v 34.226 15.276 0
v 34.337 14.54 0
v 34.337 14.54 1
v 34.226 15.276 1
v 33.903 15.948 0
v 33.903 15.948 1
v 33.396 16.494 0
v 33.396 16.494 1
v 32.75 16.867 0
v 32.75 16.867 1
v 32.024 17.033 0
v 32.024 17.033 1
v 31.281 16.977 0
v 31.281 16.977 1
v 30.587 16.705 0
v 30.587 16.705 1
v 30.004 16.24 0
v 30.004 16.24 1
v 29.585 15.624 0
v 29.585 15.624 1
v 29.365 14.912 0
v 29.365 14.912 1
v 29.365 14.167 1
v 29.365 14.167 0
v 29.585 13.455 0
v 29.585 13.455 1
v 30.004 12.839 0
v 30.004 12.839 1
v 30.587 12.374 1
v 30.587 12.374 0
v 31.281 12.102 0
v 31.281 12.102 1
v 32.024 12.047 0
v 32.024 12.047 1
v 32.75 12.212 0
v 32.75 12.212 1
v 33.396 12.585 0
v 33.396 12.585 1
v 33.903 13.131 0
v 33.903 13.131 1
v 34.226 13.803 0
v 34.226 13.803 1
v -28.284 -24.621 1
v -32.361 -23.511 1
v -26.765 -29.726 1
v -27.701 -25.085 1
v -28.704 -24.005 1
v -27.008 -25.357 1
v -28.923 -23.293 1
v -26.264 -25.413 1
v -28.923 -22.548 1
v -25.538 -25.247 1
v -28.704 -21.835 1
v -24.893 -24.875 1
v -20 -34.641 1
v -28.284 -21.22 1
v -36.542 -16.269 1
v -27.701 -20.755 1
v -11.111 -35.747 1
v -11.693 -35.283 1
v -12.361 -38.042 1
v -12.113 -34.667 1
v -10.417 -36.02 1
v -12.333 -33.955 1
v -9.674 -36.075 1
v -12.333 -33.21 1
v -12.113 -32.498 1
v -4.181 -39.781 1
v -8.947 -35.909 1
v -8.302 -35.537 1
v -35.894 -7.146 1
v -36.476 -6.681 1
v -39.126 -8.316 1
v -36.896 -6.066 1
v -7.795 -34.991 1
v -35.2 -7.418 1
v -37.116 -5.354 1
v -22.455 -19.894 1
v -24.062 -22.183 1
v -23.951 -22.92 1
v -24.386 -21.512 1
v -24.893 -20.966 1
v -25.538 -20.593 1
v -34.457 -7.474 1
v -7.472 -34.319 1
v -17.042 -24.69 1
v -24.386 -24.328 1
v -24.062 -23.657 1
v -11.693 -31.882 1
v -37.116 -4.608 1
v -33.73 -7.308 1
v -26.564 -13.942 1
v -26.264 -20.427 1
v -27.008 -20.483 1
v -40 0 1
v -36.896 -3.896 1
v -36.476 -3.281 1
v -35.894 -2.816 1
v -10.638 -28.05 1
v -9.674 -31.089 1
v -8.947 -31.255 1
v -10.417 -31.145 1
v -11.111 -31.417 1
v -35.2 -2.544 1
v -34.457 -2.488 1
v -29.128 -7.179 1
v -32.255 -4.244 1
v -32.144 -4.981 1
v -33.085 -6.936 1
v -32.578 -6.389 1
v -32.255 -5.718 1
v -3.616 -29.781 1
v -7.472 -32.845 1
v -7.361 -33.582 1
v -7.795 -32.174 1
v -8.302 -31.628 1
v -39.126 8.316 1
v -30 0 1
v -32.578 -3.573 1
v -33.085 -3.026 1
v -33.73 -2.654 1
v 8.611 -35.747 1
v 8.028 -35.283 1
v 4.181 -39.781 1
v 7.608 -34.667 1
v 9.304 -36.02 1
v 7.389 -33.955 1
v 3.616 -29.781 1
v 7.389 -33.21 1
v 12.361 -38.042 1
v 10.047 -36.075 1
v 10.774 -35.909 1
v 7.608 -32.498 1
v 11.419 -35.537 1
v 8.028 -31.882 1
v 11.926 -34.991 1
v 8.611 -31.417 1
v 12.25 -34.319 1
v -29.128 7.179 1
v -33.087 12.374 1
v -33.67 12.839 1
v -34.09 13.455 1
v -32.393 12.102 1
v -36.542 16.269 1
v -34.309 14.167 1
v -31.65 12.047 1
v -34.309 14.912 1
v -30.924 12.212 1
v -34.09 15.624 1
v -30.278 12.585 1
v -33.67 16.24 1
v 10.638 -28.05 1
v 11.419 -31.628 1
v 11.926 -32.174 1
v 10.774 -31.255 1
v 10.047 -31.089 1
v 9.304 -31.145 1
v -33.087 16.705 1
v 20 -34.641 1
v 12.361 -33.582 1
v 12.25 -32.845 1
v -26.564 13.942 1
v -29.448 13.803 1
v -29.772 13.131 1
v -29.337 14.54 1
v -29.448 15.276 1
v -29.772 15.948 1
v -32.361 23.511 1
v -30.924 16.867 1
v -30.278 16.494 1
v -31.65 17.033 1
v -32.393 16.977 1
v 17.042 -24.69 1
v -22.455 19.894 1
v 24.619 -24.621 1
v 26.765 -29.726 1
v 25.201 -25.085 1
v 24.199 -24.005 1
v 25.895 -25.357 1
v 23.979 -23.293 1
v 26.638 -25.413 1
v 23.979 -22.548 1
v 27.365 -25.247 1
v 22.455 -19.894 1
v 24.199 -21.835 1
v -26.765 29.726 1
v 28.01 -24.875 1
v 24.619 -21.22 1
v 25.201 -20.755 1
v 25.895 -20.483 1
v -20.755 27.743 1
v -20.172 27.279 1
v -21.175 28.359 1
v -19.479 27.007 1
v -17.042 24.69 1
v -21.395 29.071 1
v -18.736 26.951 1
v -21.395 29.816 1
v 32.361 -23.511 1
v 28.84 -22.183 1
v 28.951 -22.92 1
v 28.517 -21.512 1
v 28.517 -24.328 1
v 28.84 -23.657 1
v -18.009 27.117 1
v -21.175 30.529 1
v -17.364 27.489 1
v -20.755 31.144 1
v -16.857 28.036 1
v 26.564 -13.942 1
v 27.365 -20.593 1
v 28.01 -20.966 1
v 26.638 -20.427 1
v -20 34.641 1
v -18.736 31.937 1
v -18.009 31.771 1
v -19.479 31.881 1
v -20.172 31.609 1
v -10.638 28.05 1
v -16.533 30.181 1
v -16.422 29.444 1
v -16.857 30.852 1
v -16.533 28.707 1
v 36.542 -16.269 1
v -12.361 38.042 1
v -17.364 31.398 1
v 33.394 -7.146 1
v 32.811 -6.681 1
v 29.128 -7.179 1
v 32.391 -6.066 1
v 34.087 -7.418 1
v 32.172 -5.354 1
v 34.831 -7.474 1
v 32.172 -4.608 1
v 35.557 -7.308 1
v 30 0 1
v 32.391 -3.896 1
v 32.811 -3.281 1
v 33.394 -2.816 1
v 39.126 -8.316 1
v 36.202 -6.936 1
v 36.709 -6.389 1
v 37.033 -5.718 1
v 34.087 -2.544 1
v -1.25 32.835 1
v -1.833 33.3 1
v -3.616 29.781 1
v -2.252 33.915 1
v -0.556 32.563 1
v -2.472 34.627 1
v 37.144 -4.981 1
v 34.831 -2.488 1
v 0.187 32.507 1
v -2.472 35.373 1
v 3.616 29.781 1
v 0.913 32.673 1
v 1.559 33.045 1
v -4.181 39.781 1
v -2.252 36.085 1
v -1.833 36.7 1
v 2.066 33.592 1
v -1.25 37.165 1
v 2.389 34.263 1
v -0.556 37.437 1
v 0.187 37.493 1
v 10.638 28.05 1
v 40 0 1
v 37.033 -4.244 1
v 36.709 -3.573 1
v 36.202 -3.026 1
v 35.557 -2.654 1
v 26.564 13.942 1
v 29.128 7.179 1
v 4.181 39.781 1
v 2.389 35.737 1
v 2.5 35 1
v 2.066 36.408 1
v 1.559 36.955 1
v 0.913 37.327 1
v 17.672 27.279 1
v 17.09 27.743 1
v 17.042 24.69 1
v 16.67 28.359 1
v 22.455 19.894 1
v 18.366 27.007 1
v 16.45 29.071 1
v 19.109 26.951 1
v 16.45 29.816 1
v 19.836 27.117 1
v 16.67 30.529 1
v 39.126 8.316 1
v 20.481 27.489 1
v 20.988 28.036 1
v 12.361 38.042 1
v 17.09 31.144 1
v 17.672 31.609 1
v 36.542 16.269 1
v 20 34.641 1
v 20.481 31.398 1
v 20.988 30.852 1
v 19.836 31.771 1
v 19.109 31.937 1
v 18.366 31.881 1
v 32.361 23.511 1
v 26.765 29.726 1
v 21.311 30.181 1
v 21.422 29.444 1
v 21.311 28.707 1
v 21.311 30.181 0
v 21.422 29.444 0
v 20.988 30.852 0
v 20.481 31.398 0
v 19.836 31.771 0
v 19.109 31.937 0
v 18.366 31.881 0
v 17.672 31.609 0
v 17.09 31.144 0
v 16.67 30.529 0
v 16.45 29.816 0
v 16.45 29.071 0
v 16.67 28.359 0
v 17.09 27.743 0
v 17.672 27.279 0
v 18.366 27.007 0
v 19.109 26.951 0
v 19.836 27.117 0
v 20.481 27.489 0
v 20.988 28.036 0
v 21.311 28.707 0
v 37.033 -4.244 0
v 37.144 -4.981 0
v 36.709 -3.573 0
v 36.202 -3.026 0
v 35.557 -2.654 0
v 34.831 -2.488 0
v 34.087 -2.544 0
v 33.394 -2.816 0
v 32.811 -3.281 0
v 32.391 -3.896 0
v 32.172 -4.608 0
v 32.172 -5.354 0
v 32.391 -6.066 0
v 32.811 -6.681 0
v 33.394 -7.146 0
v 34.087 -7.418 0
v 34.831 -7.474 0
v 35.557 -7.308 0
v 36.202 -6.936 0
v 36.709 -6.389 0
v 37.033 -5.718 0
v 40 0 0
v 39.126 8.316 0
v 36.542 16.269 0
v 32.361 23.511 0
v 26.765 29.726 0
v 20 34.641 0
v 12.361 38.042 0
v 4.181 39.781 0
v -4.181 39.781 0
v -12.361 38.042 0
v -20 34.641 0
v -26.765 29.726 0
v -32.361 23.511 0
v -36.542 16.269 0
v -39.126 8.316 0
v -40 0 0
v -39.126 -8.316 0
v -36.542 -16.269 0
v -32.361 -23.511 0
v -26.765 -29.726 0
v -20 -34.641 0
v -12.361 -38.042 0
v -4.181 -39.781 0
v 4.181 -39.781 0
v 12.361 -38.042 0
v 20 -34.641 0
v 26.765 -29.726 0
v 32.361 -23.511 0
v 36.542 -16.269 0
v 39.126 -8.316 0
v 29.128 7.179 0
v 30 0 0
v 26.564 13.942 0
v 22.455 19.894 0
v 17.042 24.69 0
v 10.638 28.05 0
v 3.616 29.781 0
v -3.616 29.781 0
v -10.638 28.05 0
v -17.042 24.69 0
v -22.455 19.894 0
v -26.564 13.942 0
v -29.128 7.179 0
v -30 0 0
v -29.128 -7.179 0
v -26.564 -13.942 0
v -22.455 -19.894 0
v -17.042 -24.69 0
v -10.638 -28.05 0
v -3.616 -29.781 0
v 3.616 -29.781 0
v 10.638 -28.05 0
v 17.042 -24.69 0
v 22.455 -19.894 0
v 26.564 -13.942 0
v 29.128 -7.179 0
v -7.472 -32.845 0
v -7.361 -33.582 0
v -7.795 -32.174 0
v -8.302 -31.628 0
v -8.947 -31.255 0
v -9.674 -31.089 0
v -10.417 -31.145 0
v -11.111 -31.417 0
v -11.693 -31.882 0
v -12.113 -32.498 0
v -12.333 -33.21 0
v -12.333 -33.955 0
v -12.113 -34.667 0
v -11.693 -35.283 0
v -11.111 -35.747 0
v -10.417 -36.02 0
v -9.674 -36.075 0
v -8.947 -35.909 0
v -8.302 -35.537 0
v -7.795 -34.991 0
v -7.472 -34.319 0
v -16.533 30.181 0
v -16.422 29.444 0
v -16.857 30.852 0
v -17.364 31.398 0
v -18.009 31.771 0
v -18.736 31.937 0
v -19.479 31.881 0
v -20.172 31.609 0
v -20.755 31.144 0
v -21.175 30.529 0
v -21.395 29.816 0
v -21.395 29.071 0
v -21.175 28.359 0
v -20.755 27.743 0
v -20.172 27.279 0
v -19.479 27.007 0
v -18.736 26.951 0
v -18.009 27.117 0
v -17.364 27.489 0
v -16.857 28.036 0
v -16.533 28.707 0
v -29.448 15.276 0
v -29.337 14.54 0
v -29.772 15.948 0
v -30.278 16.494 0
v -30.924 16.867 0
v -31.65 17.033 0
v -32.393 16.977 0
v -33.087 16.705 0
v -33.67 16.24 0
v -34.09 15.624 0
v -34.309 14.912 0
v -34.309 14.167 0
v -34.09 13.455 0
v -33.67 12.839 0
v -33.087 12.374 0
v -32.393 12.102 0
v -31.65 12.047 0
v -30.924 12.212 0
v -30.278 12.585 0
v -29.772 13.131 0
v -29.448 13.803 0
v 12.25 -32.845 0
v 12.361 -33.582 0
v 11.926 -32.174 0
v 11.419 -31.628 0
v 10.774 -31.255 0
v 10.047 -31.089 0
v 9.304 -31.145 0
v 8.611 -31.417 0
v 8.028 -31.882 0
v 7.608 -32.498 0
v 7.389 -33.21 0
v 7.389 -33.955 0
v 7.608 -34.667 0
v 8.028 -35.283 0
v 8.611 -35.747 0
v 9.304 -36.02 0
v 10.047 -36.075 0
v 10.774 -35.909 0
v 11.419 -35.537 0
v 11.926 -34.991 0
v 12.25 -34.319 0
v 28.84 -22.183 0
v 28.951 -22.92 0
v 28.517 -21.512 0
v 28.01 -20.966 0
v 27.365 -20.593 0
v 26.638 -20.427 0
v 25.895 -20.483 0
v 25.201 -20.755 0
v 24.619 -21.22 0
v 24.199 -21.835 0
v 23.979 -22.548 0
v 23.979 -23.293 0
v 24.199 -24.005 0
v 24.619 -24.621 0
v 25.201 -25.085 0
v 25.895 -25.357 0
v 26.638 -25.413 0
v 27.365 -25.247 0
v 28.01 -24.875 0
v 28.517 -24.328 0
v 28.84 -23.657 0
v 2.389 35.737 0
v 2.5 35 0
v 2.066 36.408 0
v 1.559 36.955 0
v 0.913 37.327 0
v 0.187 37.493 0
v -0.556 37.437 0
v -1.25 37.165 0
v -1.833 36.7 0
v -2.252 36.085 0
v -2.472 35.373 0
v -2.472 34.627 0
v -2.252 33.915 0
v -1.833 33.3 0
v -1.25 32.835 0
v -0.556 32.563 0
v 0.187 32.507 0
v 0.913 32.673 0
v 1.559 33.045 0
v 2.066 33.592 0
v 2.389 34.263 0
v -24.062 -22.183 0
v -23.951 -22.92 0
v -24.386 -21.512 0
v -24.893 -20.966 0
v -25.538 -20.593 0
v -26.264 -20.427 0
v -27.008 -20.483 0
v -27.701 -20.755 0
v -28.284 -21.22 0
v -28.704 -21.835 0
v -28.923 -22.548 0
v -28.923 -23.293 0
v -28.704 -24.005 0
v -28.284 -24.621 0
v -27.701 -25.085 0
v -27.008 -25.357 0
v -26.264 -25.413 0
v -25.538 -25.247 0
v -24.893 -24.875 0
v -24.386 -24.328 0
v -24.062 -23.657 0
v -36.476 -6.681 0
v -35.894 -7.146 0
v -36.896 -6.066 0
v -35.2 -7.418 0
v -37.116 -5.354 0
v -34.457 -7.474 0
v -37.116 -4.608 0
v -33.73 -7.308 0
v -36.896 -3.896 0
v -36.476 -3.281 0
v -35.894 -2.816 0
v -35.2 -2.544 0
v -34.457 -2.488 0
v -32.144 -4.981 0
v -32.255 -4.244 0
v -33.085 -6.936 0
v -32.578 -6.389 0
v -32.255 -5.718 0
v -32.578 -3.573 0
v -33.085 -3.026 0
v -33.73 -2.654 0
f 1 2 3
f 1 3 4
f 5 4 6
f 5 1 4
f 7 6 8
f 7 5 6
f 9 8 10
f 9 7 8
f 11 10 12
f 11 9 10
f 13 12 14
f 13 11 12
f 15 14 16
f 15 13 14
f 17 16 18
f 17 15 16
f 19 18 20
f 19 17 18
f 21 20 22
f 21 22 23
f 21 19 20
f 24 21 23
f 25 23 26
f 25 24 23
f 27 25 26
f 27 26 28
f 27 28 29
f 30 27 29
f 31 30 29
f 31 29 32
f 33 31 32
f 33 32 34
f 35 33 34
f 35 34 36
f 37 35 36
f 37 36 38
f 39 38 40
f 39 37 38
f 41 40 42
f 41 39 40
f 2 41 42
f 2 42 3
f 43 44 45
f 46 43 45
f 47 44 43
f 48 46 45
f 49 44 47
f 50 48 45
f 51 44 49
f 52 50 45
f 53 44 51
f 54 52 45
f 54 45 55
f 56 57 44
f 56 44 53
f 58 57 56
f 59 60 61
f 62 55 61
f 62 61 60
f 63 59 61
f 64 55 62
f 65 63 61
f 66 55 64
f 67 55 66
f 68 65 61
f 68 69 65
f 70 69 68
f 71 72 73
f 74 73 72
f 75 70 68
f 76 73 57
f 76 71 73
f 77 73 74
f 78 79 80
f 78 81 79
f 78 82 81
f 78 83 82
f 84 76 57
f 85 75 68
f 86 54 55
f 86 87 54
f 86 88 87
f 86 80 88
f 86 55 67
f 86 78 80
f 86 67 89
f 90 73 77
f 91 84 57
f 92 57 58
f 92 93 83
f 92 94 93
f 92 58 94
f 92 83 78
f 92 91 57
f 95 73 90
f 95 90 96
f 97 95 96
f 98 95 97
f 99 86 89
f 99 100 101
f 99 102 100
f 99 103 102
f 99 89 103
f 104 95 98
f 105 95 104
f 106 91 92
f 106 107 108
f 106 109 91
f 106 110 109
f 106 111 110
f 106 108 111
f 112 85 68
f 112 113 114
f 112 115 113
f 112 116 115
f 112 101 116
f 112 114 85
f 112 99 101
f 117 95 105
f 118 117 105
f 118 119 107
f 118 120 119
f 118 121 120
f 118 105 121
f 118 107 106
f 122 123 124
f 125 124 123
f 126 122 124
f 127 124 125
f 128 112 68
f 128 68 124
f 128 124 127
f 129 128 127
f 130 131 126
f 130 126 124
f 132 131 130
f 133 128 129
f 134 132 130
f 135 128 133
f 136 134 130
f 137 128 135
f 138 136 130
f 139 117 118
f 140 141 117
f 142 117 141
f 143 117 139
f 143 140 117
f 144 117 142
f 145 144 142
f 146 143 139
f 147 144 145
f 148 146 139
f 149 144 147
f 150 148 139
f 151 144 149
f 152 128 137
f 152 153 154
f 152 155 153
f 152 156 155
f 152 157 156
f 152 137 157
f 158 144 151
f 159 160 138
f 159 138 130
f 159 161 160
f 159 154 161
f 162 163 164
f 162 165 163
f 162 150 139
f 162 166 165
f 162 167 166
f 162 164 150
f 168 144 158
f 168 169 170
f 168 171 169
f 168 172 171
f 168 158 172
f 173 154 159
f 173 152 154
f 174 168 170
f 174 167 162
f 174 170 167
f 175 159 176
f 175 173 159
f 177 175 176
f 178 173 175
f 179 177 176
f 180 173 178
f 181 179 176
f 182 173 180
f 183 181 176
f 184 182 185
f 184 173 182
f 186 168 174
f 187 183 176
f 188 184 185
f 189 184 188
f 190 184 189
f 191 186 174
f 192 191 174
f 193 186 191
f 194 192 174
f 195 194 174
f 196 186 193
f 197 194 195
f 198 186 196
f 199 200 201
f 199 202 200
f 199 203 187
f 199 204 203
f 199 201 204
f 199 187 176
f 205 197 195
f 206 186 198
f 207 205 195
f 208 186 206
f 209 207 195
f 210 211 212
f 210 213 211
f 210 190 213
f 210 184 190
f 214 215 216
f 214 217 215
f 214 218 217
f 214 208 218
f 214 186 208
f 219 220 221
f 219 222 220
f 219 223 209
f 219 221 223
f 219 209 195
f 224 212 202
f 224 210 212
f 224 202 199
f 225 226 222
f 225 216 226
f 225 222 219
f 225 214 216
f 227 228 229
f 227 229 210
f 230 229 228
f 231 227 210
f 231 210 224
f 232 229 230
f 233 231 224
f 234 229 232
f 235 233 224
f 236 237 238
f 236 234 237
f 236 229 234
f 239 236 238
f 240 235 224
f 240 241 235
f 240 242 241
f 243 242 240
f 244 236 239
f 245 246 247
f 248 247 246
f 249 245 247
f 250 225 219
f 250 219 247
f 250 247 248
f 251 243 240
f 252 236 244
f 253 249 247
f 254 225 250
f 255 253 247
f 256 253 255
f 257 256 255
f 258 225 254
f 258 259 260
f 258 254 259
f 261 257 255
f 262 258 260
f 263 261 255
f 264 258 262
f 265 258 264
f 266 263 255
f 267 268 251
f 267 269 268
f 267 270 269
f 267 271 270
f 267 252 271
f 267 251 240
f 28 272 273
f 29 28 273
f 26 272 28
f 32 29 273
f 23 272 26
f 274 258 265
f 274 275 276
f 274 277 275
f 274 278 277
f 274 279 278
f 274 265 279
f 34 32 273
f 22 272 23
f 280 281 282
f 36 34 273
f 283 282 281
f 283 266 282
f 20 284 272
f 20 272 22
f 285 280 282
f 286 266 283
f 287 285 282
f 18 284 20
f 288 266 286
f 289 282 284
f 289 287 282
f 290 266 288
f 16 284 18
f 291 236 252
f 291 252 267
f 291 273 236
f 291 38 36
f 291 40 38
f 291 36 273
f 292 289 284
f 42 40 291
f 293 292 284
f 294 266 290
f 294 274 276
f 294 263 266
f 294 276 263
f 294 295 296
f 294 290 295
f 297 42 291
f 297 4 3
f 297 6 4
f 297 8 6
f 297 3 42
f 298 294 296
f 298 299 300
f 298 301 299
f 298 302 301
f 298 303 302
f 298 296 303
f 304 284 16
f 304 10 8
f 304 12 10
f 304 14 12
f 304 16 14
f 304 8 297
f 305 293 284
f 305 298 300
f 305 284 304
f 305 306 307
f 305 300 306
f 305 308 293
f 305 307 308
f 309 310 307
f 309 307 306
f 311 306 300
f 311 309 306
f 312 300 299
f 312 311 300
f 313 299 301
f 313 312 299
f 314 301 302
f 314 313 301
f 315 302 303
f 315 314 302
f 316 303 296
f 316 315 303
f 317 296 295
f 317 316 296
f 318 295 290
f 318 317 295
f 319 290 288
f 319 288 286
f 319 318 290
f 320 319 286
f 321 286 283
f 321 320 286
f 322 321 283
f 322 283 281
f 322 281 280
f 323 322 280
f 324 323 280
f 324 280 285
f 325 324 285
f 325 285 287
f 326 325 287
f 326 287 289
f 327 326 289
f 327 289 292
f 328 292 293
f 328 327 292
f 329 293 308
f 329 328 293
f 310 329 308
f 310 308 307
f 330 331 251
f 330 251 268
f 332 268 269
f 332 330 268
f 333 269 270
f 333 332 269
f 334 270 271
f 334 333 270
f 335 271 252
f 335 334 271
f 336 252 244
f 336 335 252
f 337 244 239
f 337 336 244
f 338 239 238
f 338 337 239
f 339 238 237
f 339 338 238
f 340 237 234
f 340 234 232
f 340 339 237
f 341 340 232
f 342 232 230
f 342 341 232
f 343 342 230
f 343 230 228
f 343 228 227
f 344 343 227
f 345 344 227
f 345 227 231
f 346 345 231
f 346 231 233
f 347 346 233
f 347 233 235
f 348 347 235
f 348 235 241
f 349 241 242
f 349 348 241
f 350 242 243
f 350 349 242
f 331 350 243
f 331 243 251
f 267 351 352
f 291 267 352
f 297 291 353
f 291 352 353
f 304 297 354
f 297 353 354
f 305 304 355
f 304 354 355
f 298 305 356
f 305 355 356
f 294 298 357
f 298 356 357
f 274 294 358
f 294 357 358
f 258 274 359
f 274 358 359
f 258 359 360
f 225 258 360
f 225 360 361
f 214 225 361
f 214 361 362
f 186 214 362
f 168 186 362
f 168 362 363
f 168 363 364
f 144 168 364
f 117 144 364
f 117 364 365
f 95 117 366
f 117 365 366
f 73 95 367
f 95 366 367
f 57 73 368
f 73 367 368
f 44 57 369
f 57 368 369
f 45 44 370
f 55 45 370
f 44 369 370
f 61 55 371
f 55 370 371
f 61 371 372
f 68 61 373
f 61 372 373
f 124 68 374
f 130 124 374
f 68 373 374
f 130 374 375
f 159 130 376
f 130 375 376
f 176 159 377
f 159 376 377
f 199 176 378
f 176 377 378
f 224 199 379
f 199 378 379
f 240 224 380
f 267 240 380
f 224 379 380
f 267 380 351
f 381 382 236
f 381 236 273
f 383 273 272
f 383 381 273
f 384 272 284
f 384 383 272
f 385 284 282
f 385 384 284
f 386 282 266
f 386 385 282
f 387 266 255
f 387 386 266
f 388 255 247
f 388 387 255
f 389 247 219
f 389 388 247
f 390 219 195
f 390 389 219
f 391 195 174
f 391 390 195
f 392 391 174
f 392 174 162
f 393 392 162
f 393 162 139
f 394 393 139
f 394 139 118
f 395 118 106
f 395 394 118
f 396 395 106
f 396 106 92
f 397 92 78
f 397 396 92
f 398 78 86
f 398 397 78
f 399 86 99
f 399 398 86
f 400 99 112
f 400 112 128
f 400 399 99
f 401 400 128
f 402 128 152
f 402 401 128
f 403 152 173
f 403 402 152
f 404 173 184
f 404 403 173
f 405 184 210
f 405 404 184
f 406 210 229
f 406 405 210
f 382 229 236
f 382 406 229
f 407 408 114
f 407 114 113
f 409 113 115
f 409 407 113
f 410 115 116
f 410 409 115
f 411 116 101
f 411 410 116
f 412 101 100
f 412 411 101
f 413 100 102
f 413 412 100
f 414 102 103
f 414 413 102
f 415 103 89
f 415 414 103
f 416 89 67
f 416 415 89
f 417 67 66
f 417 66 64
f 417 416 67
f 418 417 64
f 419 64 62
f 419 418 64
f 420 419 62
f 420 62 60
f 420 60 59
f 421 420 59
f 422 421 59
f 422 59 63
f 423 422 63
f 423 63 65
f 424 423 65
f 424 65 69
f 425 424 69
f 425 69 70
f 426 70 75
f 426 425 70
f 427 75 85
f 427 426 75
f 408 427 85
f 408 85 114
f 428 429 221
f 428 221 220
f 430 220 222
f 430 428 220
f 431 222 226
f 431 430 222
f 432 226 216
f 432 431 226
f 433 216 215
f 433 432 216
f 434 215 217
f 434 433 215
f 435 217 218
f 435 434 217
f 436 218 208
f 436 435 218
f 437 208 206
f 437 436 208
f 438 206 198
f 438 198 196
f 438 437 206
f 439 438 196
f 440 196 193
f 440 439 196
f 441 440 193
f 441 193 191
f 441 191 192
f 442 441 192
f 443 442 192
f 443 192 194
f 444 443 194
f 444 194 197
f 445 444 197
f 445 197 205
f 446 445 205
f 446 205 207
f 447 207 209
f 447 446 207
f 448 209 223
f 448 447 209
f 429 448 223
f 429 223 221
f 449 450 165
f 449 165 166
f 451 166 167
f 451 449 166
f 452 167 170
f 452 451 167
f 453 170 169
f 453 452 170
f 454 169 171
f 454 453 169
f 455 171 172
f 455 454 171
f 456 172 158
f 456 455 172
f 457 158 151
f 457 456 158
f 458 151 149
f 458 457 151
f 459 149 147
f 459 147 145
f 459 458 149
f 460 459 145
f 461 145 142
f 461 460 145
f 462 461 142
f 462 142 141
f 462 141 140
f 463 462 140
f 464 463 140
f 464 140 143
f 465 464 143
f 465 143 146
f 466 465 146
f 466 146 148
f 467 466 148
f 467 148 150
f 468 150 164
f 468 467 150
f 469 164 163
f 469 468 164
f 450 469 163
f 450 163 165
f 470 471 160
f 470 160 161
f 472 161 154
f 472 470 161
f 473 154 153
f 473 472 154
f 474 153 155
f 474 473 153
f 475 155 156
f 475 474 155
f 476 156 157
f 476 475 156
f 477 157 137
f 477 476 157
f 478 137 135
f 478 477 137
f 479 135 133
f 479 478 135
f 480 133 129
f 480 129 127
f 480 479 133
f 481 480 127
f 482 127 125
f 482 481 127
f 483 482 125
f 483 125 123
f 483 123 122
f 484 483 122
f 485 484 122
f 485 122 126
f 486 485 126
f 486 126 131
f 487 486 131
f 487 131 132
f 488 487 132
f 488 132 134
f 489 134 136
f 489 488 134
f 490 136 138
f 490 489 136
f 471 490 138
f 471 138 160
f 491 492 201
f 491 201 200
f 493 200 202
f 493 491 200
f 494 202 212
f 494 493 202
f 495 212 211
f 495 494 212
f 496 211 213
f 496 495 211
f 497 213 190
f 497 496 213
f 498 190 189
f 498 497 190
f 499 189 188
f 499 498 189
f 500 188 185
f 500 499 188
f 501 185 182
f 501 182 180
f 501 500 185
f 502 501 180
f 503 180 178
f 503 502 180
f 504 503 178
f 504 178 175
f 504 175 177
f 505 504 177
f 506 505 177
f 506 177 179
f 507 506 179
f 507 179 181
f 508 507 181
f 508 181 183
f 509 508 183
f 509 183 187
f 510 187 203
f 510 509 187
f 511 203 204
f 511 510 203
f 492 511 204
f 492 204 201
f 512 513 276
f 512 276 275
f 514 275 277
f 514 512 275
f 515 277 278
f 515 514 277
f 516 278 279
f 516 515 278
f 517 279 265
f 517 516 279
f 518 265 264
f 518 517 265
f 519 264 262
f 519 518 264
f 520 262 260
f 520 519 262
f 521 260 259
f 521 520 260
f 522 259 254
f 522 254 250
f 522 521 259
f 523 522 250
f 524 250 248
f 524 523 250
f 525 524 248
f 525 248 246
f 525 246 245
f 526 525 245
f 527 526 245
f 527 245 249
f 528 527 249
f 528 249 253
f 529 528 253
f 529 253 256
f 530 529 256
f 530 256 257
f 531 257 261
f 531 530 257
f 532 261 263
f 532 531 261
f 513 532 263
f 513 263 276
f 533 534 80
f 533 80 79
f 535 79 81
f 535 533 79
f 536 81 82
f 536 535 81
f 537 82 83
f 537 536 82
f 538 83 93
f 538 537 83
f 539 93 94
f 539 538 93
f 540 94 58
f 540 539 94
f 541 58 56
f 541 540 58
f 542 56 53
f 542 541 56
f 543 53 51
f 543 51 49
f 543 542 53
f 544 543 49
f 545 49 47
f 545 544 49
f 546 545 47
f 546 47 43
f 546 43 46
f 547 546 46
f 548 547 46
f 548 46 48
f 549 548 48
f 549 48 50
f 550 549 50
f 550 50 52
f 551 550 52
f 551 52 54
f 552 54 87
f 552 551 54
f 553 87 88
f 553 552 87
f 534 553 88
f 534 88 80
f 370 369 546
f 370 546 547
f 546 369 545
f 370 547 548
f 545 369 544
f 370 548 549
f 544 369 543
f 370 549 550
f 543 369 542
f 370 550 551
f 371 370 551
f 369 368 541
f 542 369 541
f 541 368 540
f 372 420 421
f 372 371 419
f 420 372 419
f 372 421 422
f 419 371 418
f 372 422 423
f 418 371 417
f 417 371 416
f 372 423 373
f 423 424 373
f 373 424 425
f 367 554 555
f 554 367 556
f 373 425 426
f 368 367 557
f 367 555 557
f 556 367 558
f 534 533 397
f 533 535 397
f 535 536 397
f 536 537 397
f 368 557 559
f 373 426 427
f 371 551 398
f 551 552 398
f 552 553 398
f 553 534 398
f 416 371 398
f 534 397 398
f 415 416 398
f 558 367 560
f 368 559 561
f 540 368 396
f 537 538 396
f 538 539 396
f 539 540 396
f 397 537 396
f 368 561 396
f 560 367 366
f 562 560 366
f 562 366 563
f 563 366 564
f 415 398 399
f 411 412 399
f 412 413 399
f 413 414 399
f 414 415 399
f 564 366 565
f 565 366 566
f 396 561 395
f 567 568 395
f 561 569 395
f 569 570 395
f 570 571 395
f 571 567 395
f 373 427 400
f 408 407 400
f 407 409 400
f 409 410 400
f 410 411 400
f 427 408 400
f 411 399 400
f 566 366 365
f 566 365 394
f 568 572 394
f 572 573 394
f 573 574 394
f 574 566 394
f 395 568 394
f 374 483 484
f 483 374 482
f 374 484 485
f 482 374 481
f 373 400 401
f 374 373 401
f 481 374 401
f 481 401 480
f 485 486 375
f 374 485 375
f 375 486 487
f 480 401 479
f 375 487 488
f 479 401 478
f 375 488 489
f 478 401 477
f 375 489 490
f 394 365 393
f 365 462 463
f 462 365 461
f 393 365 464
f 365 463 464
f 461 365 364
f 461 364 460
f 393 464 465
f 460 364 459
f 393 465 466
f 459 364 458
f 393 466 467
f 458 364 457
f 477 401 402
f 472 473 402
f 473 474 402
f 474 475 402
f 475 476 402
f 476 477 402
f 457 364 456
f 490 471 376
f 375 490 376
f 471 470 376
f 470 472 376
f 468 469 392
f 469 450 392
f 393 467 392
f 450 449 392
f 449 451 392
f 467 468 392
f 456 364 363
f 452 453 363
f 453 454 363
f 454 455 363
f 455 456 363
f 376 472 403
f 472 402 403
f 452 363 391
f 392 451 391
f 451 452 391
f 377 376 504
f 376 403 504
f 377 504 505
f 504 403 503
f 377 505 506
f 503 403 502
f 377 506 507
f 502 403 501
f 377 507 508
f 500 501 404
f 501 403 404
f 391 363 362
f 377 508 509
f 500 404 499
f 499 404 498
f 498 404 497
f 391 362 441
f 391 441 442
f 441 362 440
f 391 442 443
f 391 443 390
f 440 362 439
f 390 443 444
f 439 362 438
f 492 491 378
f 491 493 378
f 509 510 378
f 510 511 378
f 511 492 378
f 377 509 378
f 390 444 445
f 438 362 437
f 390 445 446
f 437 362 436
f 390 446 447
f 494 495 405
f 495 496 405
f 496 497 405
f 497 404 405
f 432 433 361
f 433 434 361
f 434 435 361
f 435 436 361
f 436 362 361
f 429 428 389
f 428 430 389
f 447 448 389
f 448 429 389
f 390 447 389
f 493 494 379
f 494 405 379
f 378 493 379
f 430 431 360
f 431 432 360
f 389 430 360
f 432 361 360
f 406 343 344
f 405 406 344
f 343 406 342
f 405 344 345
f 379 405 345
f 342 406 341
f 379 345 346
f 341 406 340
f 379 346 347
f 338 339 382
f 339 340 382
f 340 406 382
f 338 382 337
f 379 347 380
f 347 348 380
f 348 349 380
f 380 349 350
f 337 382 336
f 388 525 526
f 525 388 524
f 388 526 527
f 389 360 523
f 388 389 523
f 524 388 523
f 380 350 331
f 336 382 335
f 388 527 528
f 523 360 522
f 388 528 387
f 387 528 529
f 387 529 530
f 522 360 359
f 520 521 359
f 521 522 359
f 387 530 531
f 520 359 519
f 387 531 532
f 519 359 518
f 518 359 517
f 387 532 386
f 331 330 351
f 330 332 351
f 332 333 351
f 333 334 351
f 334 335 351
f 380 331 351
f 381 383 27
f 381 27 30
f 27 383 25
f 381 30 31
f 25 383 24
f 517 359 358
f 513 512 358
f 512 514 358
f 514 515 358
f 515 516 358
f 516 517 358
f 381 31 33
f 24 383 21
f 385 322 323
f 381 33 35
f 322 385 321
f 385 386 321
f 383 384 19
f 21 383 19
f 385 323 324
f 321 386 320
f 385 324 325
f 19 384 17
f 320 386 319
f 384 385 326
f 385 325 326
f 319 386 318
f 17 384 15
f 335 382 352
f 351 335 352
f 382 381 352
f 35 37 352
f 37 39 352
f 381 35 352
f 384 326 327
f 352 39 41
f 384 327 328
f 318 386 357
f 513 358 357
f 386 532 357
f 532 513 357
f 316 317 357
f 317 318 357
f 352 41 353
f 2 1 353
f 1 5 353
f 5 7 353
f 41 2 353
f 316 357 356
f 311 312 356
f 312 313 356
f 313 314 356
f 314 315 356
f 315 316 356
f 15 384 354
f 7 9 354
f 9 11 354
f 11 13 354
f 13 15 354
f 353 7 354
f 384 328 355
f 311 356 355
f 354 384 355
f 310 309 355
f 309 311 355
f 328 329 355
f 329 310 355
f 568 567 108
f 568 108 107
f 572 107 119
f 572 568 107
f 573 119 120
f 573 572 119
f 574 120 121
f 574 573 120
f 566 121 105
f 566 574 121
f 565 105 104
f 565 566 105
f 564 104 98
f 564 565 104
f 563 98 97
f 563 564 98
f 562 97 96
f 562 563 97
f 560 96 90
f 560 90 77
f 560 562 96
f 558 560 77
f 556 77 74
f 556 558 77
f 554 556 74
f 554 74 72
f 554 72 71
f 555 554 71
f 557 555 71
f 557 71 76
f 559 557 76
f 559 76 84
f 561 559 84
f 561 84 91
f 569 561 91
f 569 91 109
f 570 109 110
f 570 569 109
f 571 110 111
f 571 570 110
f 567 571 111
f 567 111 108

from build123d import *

# Parameters (mm, degrees)
SKETCH1_R           = 40
SKETCH1_R_2         = 30
SKETCH1_R_3         = 2.5
BOSS_EXTRUDE1_DEPTH = 1


with BuildPart() as part:
    # Sketch1 → Boss-Extrude1 (new body)
    with BuildSketch(Plane.XY):
        Circle(SKETCH1_R)
        Circle(SKETCH1_R_2, mode=Mode.SUBTRACT)
        with Locations((0, 35)):
            Circle(SKETCH1_R_3, mode=Mode.SUBTRACT)
        with Locations((18.922428611, 29.443873649)):
            Circle(SKETCH1_R_3, mode=Mode.SUBTRACT)
        with Locations((31.837119837, 14.539525455)):
            Circle(SKETCH1_R_3, mode=Mode.SUBTRACT)
        with Locations((34.643750466, -4.98101934)):
            Circle(SKETCH1_R_3, mode=Mode.SUBTRACT)
        with Locations((26.451235102, -22.920125688)):
            Circle(SKETCH1_R_3, mode=Mode.SUBTRACT)
        with Locations((9.860639489, -33.582254077)):
            Circle(SKETCH1_R_3, mode=Mode.SUBTRACT)
        with Locations((-9.860639489, -33.582254077)):
            Circle(SKETCH1_R_3, mode=Mode.SUBTRACT)
        with Locations((-26.451235102, -22.920125688)):
            Circle(SKETCH1_R_3, mode=Mode.SUBTRACT)
        with Locations((-34.643750466, -4.98101934)):
            Circle(SKETCH1_R_3, mode=Mode.SUBTRACT)
        with Locations((-31.837119837, 14.539525455)):
            Circle(SKETCH1_R_3, mode=Mode.SUBTRACT)
        with Locations((-18.922428611, 29.443873649)):
            Circle(SKETCH1_R_3, mode=Mode.SUBTRACT)
    extrude(amount=BOSS_EXTRUDE1_DEPTH)


solid = part.part
